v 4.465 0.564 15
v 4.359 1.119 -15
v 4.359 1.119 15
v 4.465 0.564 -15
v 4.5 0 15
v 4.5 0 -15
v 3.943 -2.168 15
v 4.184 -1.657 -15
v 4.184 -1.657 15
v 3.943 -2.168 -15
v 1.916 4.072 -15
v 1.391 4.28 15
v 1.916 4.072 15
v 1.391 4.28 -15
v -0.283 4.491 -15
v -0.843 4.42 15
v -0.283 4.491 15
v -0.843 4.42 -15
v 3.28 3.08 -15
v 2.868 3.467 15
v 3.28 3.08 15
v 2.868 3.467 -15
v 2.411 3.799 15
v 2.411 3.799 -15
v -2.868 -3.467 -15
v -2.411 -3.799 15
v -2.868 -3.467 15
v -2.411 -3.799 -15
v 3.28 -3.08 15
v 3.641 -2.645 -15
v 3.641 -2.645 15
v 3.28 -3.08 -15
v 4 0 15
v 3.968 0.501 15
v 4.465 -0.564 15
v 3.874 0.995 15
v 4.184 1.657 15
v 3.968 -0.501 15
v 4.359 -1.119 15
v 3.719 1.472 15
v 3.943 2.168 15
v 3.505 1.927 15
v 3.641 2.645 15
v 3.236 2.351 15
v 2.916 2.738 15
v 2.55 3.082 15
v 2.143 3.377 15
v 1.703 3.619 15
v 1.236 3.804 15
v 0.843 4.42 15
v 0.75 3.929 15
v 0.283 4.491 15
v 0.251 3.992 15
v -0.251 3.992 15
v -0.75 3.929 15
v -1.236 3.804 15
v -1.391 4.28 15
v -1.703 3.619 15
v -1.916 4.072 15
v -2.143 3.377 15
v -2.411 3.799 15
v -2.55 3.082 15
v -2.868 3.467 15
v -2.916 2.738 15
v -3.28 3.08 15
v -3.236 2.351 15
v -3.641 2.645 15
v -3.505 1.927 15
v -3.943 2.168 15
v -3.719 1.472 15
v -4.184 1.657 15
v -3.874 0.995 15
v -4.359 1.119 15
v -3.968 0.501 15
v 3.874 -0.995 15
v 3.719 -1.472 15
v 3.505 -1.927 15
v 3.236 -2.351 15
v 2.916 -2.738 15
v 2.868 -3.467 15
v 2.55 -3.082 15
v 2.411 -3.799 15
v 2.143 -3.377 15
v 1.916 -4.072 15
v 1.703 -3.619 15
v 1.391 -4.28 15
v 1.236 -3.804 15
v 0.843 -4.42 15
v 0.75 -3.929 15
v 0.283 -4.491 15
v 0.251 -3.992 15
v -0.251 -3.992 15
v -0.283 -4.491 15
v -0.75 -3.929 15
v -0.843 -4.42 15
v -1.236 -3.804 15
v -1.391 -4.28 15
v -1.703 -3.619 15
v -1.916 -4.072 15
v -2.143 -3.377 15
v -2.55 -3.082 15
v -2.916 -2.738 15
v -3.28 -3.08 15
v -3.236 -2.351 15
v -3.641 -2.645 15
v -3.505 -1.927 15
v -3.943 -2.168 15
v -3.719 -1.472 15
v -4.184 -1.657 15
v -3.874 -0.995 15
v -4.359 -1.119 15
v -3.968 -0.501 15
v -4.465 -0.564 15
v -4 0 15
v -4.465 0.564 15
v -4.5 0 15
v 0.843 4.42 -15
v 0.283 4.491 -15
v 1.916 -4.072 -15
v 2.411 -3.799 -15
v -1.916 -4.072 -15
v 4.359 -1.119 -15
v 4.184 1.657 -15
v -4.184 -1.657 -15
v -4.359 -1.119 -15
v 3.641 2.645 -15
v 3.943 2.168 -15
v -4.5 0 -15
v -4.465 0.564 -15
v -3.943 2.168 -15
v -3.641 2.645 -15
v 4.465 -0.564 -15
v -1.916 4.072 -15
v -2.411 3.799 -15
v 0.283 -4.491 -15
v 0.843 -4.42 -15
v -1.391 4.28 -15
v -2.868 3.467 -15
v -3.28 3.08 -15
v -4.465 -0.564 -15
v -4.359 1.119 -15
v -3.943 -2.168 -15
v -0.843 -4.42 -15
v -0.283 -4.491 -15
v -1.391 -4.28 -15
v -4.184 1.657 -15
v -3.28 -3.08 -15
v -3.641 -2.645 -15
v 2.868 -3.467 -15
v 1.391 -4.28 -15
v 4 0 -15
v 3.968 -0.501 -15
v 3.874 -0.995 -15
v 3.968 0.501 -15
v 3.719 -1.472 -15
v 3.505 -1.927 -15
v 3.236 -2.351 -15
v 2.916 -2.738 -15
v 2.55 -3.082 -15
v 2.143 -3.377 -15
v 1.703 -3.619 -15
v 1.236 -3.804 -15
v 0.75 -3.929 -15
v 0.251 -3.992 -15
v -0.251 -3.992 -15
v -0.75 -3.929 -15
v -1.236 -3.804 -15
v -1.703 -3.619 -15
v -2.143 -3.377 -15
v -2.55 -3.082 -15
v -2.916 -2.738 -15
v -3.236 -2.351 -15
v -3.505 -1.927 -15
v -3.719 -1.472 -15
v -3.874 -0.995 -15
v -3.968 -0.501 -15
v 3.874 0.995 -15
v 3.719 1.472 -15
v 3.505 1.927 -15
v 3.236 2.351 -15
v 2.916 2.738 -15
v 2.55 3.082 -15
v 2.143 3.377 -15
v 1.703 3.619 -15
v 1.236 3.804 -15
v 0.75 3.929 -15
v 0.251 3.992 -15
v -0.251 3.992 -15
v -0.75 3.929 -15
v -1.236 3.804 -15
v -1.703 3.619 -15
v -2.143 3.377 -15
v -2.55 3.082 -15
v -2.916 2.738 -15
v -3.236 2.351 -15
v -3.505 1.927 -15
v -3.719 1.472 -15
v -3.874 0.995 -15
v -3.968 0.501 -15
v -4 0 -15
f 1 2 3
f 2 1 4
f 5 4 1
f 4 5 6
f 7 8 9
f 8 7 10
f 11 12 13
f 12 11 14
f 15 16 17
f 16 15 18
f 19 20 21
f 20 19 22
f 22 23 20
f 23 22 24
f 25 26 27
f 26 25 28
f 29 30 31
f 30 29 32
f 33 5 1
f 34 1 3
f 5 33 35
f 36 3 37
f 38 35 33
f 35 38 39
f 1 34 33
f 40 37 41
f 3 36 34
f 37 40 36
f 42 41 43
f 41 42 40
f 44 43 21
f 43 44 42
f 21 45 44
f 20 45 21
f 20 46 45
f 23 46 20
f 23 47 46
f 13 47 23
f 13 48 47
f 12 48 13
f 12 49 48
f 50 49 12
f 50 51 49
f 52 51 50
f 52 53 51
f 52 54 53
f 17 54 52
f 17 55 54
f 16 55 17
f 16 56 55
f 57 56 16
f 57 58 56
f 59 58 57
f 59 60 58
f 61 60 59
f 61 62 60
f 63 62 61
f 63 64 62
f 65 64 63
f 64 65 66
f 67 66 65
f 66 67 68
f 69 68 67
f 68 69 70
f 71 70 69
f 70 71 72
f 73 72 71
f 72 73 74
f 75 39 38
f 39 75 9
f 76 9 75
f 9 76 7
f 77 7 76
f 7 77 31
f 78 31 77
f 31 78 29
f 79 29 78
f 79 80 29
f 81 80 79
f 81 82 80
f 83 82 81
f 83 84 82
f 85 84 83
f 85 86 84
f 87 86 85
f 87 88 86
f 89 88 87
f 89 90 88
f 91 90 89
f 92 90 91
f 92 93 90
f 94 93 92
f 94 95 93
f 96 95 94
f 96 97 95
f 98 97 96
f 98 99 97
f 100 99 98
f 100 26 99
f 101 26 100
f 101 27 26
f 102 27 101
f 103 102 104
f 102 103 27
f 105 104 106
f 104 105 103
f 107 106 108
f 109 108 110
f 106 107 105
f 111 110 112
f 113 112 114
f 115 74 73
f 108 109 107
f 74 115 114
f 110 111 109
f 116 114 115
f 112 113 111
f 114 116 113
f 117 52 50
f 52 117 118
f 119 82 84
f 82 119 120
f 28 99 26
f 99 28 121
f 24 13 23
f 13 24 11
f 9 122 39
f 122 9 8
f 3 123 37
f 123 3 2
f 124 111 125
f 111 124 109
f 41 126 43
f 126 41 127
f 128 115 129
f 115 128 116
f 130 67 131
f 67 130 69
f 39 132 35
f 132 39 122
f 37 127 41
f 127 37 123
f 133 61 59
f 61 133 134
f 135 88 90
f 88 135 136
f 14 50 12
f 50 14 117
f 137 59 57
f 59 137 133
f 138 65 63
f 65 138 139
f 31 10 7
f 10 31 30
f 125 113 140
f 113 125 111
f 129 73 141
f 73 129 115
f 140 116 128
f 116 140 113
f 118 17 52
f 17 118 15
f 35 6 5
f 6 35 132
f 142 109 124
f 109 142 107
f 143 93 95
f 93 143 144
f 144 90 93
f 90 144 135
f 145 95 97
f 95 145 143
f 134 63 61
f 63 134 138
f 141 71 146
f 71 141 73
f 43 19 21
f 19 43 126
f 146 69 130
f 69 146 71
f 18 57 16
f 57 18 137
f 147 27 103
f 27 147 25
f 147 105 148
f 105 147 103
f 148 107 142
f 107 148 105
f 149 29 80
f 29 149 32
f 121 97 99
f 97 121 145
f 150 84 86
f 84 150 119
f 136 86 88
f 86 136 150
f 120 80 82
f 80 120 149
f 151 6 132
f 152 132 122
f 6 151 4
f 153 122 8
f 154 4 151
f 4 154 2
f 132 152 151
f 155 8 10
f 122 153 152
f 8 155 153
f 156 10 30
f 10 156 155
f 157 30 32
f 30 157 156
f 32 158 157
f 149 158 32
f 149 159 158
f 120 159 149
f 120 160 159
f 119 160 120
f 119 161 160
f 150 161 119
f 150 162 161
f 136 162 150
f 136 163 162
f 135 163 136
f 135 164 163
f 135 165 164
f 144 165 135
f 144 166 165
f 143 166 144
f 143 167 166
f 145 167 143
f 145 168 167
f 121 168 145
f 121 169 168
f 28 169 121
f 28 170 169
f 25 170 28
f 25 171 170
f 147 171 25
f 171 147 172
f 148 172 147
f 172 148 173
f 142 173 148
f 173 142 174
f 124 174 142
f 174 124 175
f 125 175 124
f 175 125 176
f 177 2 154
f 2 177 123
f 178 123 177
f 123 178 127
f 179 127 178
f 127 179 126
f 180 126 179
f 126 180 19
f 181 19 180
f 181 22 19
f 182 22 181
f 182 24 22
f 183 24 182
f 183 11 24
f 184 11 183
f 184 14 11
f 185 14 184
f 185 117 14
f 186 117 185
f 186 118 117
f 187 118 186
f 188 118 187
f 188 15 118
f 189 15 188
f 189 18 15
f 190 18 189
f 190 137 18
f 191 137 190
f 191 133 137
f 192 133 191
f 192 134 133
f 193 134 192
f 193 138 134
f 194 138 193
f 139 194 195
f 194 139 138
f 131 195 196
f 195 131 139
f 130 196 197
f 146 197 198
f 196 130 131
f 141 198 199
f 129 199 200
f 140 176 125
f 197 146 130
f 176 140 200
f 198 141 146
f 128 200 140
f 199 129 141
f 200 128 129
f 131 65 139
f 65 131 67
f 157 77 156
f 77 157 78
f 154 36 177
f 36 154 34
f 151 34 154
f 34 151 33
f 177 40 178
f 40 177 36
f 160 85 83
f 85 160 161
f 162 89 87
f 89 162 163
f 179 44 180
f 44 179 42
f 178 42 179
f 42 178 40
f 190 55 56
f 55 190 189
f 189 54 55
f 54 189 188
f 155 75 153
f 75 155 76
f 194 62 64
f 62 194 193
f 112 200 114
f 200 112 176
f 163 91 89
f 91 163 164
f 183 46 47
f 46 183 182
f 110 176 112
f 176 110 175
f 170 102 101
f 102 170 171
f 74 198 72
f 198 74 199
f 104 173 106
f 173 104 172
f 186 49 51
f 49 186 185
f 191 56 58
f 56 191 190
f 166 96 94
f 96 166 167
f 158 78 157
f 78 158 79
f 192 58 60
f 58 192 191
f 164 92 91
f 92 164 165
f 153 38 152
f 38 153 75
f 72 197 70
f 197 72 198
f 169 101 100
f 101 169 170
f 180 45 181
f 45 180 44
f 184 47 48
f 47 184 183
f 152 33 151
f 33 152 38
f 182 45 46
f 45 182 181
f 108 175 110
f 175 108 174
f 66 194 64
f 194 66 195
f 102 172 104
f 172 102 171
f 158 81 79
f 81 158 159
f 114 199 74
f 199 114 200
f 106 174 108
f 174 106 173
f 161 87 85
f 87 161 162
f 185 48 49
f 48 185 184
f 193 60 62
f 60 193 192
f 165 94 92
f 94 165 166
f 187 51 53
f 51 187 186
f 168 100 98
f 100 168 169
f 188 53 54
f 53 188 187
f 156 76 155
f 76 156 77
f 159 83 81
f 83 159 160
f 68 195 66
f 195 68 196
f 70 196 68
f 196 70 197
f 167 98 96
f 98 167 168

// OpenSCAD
$fn = 50;


difference() {
	union() {
		translate(v = [0, 0, -15.0000000000]) {
			cylinder(h = 30, r = 4.5000000000);
		}
	}
	union() {
		translate(v = [0, 0, -100.0000000000]) {
			cylinder(h = 200, r = 4.0000000000);
		}
	}
}
